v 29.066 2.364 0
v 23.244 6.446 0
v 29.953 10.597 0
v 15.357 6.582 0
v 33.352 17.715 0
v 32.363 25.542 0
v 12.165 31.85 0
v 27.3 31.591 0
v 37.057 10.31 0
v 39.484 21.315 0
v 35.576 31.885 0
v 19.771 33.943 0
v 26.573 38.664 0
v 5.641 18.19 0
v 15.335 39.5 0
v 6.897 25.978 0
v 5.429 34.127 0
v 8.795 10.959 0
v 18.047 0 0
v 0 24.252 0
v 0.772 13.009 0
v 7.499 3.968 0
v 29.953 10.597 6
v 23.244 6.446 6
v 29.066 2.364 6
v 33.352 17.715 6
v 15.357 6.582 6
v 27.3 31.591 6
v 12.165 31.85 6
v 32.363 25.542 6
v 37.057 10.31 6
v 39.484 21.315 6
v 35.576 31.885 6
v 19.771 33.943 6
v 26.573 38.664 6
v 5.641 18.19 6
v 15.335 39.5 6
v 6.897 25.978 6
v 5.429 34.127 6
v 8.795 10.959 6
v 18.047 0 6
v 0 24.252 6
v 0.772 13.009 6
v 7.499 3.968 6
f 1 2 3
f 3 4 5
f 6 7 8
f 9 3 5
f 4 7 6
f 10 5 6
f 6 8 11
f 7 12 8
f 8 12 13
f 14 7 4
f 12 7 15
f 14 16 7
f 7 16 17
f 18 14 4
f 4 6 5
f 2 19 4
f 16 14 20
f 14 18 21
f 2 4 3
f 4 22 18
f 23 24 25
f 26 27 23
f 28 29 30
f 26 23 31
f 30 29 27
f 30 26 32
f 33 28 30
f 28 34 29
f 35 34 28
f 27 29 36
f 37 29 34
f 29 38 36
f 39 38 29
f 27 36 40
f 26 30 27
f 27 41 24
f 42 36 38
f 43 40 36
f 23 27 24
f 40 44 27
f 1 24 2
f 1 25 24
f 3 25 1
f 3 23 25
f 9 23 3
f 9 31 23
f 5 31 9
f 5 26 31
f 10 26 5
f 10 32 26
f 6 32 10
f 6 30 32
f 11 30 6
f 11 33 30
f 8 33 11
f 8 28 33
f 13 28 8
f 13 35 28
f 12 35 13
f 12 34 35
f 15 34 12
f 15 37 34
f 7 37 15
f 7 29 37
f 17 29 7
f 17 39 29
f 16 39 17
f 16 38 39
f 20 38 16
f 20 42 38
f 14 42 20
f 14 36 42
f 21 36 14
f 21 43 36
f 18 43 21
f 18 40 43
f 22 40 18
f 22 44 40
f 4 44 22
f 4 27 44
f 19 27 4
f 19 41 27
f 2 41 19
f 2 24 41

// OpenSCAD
$fn = 32;

// ----------------------------------------------------------------------
// Chain sprocket: 11 teeth, 14 mm root radius
// ----------------------------------------------------------------------

// --- parameters (mm) ---
profile_height = 6;       // extrusion height
profile_points = 22;      // points of the closed outline

profile = [[33.352, 17.715], [39.484, 21.315], [32.363, 25.542], [35.576, 31.885], [27.3, 31.591], [26.573, 38.664], [19.771, 33.943], [15.335, 39.5], [12.165, 31.85], [5.429, 34.127], [6.897, 25.978], [0, 24.252], [5.641, 18.19], [0.772, 13.009], [8.795, 10.959], [7.499, 3.968], [15.357, 6.582], [18.047, 0], [23.244, 6.446], [29.066, 2.364], [29.953, 10.597], [37.057, 10.31]];  // single closed polygon, 22 points, counter clockwise

// --- the one profile operation ---
linear_extrude(height = profile_height) polygon(points = profile);
